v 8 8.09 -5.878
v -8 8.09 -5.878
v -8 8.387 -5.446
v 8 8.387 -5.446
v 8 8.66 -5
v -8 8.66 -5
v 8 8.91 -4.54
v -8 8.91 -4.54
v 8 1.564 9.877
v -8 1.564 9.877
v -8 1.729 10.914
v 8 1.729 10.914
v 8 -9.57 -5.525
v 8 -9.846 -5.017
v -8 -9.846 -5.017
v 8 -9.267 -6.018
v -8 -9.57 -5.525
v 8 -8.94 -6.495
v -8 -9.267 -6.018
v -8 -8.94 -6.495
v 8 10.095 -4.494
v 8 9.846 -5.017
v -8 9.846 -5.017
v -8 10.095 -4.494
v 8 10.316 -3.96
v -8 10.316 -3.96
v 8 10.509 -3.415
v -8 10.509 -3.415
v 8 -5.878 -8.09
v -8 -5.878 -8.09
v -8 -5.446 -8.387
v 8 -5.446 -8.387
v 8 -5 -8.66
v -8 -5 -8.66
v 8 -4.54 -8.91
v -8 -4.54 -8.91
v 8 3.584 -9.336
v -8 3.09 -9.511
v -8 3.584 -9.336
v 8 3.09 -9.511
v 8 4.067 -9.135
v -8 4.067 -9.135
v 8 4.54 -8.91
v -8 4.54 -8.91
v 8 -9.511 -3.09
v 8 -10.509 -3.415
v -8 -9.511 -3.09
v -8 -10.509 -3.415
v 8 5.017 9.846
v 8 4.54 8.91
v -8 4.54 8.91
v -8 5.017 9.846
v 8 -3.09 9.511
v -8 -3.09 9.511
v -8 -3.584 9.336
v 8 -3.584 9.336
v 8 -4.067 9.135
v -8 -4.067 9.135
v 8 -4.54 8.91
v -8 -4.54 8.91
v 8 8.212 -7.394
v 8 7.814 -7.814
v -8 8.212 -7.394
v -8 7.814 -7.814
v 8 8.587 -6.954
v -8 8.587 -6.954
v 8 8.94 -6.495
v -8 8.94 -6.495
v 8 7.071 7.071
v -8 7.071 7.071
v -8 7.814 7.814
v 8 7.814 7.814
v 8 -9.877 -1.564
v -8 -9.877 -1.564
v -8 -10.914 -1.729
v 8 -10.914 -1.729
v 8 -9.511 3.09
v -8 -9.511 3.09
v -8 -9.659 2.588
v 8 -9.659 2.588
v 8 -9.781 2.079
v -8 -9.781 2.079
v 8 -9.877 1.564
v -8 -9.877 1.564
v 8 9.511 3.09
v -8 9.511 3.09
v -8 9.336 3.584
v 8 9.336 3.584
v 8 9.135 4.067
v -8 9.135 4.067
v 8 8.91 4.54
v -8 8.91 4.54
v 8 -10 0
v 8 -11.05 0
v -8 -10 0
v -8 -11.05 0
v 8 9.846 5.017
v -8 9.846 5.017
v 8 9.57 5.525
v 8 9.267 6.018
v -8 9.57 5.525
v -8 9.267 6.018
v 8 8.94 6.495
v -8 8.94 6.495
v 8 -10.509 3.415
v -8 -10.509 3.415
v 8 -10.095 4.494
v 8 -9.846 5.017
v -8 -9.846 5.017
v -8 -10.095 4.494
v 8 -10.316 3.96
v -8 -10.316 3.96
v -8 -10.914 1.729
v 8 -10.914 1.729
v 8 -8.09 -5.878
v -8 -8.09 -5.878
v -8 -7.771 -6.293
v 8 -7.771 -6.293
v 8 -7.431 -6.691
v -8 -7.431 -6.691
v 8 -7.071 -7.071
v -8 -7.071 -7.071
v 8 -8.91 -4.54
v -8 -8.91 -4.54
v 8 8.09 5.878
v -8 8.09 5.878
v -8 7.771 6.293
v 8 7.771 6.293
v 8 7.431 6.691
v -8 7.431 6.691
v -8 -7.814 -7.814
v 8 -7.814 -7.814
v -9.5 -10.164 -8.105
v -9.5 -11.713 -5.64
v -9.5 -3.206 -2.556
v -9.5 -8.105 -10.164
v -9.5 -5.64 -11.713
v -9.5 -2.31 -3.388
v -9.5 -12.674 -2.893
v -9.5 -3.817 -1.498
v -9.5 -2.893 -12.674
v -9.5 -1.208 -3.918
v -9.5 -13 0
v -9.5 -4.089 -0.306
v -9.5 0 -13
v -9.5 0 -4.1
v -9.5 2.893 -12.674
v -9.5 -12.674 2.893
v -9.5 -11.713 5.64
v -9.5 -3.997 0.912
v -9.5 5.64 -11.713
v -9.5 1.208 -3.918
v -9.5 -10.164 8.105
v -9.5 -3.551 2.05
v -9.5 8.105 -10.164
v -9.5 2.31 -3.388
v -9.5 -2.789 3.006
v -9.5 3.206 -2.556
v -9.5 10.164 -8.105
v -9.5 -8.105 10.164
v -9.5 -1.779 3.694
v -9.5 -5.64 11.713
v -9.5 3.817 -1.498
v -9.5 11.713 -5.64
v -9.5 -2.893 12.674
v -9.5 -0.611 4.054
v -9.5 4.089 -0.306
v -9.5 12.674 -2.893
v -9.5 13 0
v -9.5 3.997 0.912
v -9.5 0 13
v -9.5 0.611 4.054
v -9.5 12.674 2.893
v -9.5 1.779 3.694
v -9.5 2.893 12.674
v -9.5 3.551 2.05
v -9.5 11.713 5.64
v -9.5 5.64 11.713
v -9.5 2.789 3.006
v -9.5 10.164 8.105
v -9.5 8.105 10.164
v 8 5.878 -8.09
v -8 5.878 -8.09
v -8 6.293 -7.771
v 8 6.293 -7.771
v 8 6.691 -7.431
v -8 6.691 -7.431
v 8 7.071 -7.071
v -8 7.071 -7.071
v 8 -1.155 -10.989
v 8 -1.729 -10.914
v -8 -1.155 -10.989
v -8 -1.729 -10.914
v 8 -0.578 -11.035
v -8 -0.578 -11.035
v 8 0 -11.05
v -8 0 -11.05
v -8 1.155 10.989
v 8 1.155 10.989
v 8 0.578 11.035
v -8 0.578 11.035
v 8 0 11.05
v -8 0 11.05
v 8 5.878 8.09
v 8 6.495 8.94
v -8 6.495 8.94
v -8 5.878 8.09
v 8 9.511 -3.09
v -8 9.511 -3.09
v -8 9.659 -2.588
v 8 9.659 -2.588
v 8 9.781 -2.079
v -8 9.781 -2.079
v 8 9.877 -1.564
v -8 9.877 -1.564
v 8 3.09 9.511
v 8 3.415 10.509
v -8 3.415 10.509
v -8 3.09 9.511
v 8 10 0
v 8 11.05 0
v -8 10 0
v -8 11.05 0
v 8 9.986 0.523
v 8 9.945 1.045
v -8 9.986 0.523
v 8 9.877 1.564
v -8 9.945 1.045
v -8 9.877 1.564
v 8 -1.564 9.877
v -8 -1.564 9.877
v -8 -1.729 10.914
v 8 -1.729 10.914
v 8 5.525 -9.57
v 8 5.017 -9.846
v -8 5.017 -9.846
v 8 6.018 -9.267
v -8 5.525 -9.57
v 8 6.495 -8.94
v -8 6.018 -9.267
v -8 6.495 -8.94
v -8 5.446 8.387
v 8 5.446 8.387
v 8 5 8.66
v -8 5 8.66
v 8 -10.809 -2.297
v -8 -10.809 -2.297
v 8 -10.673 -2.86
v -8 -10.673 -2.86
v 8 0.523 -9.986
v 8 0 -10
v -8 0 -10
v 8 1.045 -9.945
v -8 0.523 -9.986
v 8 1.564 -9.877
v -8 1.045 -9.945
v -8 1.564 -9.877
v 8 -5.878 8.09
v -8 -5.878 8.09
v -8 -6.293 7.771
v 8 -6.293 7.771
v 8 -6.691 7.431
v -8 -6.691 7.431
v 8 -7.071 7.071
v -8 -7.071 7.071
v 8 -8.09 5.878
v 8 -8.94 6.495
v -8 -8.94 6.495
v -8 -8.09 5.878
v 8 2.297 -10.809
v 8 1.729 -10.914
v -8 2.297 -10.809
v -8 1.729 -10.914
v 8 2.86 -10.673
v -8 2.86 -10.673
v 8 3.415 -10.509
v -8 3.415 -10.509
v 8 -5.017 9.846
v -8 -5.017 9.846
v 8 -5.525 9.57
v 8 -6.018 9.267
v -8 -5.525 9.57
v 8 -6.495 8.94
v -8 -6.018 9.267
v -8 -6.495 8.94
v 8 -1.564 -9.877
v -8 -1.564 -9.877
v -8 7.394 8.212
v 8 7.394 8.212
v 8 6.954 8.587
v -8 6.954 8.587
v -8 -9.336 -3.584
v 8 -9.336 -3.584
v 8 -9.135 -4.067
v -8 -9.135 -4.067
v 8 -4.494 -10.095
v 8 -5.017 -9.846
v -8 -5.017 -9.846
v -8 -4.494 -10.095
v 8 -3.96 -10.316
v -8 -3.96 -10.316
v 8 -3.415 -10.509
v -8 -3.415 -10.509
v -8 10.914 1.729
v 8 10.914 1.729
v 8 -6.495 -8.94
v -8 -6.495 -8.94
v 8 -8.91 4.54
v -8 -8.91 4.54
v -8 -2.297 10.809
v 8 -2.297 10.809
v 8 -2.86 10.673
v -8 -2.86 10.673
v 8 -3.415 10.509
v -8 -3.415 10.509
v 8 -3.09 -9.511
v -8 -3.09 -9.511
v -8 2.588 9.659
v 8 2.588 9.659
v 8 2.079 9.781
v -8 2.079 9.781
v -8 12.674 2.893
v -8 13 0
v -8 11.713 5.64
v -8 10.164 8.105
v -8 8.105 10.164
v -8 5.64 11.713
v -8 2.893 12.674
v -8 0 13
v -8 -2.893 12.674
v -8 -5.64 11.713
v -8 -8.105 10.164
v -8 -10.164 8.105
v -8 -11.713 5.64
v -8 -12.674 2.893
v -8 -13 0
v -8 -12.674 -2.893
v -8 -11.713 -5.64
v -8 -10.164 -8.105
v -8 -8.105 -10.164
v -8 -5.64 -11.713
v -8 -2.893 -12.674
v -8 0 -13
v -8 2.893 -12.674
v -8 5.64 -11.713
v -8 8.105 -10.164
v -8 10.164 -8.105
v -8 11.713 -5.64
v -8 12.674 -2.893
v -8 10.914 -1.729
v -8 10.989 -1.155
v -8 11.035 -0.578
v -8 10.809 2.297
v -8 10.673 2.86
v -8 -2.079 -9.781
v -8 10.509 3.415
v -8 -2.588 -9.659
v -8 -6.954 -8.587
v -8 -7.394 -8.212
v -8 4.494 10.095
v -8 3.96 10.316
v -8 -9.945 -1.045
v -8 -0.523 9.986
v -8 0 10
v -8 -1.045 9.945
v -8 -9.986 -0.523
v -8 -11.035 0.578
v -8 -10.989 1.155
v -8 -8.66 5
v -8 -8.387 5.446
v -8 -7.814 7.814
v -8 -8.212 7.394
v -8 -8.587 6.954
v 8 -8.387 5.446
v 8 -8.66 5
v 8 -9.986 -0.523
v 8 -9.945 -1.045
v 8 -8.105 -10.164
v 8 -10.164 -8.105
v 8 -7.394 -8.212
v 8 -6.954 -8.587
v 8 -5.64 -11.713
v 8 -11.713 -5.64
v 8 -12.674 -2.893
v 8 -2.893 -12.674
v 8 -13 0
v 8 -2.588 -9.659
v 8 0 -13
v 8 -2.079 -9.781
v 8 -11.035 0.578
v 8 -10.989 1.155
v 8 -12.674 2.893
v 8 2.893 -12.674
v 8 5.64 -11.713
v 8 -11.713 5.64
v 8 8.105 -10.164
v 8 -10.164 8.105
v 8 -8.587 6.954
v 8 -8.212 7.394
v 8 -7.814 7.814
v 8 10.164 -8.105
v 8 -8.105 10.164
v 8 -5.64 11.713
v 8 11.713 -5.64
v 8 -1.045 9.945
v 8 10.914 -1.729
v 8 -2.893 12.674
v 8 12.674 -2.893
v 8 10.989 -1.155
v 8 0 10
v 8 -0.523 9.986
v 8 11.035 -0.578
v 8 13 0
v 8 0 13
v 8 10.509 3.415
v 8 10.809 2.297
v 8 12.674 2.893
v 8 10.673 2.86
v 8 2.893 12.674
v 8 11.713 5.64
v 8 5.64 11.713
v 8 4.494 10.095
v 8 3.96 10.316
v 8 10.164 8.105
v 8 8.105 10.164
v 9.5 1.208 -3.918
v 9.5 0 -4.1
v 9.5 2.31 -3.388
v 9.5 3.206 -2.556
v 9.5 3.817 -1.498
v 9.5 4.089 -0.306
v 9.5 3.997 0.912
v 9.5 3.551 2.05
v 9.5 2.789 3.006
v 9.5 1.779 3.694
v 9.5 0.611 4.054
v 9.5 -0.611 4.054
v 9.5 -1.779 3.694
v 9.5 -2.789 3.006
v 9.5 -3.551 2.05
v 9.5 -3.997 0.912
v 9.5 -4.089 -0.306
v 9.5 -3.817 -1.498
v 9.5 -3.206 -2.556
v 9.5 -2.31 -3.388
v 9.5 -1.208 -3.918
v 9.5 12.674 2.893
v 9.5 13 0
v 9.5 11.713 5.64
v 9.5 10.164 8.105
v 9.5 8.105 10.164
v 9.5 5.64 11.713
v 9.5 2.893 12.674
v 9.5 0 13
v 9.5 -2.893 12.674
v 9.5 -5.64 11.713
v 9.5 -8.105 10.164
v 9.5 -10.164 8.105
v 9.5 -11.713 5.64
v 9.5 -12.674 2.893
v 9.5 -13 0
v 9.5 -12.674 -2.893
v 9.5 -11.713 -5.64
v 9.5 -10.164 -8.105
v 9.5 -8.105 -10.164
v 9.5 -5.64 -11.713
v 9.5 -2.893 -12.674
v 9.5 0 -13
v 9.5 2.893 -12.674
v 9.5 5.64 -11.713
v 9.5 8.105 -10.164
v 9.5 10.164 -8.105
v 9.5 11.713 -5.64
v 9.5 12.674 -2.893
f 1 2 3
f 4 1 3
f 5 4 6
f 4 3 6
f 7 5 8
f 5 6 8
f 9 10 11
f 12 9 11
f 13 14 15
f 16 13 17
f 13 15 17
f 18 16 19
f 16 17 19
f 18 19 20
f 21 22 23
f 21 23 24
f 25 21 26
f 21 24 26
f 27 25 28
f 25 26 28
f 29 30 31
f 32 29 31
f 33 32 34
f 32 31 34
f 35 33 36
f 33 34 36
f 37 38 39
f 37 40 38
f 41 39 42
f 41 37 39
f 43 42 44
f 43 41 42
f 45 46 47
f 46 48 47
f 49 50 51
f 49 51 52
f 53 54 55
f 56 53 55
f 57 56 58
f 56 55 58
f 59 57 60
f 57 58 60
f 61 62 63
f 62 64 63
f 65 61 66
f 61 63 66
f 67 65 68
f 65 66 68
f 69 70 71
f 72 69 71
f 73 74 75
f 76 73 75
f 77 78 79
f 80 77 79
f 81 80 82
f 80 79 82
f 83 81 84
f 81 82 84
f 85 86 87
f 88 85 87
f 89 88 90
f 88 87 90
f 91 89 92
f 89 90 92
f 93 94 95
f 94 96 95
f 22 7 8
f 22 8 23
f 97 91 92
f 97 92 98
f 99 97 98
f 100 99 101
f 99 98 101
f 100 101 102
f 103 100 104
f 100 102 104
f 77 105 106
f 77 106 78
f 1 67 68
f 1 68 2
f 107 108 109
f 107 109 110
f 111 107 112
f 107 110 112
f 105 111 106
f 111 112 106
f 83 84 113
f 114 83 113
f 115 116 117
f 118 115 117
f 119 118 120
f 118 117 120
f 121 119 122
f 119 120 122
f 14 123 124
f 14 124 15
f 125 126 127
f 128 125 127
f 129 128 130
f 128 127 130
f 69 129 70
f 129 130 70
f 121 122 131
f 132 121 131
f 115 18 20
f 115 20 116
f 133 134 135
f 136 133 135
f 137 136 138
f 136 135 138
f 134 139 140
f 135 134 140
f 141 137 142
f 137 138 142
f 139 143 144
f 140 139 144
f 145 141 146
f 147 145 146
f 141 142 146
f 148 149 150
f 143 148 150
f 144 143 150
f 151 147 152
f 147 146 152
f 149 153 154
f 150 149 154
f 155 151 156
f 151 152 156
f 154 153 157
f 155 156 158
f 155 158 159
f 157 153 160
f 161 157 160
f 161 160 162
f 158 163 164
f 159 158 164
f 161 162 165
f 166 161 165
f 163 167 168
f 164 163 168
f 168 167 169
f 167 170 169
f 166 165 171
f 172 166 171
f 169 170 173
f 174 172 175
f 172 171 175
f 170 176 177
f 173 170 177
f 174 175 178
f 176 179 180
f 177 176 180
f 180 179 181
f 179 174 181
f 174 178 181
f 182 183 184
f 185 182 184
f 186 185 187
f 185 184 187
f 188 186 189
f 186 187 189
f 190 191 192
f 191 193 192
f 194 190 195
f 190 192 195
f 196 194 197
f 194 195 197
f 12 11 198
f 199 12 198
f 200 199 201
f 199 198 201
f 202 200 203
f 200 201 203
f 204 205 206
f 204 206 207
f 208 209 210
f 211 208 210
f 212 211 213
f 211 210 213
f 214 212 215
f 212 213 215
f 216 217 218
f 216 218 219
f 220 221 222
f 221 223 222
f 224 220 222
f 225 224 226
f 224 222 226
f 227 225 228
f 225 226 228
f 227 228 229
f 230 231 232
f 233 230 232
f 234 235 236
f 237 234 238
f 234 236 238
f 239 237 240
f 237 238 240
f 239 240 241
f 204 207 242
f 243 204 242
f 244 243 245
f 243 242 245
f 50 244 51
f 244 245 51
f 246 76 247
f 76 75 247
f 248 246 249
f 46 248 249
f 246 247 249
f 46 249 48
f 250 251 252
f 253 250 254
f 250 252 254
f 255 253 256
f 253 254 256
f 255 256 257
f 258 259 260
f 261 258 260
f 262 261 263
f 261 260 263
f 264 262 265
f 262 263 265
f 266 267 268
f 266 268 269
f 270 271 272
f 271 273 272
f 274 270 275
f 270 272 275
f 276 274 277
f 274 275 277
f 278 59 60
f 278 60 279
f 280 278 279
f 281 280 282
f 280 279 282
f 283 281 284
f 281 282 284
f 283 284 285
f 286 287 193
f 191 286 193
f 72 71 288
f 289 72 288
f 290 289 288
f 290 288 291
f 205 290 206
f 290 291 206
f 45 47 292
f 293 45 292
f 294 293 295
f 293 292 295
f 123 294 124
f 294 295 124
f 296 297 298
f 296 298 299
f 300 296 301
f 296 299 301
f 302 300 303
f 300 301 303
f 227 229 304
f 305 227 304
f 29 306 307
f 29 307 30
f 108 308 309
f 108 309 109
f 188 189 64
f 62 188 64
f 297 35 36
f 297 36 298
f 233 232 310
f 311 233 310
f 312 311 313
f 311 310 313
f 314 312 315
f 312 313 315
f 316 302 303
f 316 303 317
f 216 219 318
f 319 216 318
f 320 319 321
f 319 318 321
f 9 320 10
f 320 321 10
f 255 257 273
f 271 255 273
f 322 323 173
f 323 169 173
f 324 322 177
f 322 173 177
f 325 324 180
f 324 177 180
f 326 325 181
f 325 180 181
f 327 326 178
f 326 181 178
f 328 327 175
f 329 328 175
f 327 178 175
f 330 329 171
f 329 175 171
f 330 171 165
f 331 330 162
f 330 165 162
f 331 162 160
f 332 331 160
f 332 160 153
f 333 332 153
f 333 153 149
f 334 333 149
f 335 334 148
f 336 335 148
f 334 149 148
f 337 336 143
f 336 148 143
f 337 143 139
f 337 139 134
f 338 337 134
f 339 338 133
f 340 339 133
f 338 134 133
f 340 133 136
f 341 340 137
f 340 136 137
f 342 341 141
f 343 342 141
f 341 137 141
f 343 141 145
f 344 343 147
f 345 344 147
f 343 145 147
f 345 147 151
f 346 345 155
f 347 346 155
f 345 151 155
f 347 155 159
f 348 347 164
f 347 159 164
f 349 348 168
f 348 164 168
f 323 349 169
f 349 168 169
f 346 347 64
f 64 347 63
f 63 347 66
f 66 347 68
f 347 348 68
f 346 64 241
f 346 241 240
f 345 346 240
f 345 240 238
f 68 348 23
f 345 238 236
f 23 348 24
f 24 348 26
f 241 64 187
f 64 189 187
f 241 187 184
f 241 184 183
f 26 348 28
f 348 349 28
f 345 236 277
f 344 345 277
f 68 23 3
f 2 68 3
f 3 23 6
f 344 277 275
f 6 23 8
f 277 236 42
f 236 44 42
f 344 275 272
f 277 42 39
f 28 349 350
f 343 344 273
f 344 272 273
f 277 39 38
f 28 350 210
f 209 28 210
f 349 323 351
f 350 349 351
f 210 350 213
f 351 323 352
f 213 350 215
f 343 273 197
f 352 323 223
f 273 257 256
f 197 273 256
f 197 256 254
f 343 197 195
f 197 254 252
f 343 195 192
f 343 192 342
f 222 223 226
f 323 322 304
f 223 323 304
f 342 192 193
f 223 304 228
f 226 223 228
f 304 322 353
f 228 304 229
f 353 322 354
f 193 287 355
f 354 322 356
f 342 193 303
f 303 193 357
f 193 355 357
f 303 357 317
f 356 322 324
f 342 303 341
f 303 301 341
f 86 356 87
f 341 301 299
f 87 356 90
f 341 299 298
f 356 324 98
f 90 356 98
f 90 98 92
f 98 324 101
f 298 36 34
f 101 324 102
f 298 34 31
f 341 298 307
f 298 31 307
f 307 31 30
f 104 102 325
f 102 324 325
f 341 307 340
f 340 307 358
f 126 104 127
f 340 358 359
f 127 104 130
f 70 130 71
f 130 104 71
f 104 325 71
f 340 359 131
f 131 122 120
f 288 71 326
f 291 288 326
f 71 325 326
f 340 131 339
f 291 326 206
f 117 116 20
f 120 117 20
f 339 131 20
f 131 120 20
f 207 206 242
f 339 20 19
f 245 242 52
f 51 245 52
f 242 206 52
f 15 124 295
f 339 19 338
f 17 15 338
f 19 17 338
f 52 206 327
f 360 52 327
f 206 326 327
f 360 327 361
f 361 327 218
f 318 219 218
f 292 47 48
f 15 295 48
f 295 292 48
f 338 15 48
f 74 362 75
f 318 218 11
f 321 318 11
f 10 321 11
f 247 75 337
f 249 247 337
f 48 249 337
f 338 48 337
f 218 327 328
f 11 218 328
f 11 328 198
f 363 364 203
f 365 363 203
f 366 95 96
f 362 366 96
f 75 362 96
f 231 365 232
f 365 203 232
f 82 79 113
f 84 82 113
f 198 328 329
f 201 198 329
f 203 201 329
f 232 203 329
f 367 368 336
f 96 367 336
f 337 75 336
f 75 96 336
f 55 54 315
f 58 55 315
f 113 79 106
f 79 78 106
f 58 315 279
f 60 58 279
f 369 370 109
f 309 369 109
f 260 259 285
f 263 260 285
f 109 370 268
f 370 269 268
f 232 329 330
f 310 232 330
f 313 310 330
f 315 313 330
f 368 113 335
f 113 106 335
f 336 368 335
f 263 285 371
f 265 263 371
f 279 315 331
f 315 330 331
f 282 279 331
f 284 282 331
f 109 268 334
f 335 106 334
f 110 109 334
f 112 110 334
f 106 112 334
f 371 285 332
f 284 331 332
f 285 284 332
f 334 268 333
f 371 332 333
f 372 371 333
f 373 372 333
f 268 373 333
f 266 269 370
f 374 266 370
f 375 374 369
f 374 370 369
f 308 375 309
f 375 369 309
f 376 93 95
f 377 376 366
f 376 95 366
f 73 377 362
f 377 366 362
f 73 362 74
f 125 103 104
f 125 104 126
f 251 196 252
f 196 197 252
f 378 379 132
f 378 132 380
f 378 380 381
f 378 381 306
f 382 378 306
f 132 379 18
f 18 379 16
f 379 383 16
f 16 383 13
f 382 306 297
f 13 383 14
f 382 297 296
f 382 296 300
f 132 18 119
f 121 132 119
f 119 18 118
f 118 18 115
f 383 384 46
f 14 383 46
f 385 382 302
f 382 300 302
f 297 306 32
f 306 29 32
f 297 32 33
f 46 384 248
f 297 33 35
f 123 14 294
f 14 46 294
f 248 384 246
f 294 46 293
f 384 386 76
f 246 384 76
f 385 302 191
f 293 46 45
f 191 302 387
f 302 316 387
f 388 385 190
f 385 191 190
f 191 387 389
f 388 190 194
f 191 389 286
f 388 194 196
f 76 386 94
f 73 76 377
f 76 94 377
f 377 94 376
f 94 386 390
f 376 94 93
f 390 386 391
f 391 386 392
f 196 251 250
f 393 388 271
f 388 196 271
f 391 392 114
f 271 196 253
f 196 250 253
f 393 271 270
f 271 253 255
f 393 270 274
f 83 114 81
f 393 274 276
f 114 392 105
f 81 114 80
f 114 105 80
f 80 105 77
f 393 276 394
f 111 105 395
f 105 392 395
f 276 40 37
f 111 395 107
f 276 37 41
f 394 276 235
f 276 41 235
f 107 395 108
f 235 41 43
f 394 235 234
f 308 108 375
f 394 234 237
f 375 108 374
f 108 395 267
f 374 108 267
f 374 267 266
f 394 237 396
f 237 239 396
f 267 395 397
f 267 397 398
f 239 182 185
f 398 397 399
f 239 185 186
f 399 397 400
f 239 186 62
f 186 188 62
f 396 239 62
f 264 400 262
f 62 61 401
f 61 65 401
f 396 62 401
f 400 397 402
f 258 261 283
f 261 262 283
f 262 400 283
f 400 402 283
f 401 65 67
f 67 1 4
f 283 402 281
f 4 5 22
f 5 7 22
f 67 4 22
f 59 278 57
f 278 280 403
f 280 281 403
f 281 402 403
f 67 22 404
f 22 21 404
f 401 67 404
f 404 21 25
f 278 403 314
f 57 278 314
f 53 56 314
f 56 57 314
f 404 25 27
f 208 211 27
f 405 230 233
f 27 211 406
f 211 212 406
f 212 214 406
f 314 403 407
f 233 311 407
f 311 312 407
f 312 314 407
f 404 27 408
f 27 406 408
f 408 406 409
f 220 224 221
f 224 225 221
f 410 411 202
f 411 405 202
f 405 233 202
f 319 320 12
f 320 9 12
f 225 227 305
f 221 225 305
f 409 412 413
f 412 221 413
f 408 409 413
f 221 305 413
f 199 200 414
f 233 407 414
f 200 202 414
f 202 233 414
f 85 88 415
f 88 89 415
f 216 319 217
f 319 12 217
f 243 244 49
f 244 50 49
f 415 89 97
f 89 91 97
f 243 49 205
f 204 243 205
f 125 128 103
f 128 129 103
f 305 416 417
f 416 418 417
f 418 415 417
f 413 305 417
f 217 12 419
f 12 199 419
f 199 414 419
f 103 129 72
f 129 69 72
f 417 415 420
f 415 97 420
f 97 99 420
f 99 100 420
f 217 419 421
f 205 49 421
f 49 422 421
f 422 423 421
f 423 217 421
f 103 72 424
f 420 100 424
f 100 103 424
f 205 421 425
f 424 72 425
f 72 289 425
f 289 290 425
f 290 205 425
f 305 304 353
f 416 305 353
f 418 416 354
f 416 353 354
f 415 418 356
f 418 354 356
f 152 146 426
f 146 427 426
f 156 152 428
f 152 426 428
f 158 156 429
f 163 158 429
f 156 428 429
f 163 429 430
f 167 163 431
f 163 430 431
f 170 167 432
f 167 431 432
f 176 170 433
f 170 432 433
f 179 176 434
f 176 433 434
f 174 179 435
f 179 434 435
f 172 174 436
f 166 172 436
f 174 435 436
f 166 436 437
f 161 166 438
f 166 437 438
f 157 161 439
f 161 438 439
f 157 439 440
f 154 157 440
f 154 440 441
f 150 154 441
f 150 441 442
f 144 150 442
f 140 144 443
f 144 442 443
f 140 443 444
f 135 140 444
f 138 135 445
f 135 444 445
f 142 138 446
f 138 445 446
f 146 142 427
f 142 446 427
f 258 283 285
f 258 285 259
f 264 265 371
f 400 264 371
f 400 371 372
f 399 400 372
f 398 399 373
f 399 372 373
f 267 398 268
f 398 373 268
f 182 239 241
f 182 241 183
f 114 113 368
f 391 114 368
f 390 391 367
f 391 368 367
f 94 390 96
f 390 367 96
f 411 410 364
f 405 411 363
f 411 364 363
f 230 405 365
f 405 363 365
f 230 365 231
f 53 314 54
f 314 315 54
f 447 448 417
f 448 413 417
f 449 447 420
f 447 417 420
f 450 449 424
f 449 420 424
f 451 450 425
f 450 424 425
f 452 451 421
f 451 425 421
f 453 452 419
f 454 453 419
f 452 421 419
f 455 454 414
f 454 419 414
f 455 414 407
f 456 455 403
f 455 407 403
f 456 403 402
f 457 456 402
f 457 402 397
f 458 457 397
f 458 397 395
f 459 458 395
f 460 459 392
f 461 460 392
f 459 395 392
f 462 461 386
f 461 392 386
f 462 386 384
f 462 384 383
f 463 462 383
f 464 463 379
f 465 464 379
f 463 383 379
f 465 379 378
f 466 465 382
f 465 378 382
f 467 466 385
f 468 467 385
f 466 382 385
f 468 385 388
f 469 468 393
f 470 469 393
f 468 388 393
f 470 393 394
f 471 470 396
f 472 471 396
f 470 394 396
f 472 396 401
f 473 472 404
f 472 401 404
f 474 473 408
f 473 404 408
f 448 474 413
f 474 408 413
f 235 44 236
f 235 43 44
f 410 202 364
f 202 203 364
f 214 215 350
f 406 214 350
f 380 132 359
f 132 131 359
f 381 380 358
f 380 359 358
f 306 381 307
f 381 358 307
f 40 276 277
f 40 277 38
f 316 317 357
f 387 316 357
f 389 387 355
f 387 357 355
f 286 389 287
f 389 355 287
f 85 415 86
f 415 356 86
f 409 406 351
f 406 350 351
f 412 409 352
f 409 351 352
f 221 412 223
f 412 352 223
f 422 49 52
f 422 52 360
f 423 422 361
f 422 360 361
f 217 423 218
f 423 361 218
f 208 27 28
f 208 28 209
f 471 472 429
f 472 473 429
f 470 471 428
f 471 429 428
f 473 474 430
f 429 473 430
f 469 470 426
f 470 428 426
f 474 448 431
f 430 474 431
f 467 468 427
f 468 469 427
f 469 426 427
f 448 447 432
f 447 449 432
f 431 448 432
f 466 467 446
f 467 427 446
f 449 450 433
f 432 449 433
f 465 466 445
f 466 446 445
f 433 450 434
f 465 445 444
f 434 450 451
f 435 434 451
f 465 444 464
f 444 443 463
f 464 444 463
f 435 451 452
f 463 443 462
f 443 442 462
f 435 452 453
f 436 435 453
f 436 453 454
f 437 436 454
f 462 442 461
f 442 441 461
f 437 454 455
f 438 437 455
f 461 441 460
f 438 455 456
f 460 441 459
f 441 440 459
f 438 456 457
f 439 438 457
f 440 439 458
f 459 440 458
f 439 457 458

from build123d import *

# Parameters (mm, degrees)
CUT_EXTRUDE_1_DEPTH = 8
SKETCH_7_R          = 4.1
CUT_EXTRUDE_3_DEPTH = 10


with BuildPart() as part:
    # 草图1 → 旋转1 (revolve)
    with BuildSketch(Plane.XY):
        Polygon((-9.5, 0), (9.5, 0), (9.5, 13), (8, 13), (8, 11.05), (-8, 11.05), (-8, 13), (-9.5, 13), align=None)
    revolve(axis=Axis((-9.5, 0, 0), (1, 0, 0)))

    # 草图2 → 切除-拉伸1 (cut, symmetric)
    with BuildSketch(Plane(origin=(0, 0, 0), x_dir=(0, 0, -1), z_dir=(1, 0, 0))):
        with BuildLine():
            Line((11.05, 0), (10, 0))
            ThreePointArc((10, 0), (9.969173337, 0.784590957), (9.876883406, 1.56434465))
            Line((9.876883406, 1.56434465), (10.913956164, 1.728600839))
            ThreePointArc((10.913956164, 1.728600839), (11.015936538, 0.866973008), (11.05, 0))
        make_face()
        with BuildLine():
            Line((10.509174505, -3.414637788), (9.510565163, -3.090169944))
            ThreePointArc((9.510565163, -3.090169944), (9.723699204, -2.334453639), (9.876883406, -1.56434465))
            Line((9.876883406, -1.56434465), (10.913956164, -1.728600839))
            ThreePointArc((10.913956164, -1.728600839), (10.74468762, -2.579571271), (10.509174505, -3.414637788))
        make_face()
        with BuildLine():
            Line((8.939637788, -6.495027038), (8.090169944, -5.877852523))
            ThreePointArc((8.090169944, -5.877852523), (8.526401644, -5.224985647), (8.910065242, -4.539904997))
            Line((8.910065242, -4.539904997), (9.845622092, -5.016595022))
            ThreePointArc((9.845622092, -5.016595022), (9.421673816, -5.77360914), (8.939637788, -6.495027038))
        make_face()
        with BuildLine():
            Line((6.495027038, -8.939637788), (5.877852523, -8.090169944))
            ThreePointArc((5.877852523, -8.090169944), (6.494480483, -7.604059656), (7.071067812, -7.071067812))
            Line((7.071067812, -7.071067812), (7.813529932, -7.813529932))
            ThreePointArc((7.813529932, -7.813529932), (7.176400934, -8.40248592), (6.495027038, -8.939637788))
        make_face()
        with BuildLine():
            Line((3.414637788, -10.509174505), (3.090169944, -9.510565163))
            ThreePointArc((3.090169944, -9.510565163), (3.826834324, -9.238795325), (4.539904997, -8.910065242))
            Line((4.539904997, -8.910065242), (5.016595022, -9.845622092))
            ThreePointArc((5.016595022, -9.845622092), (4.228651928, -10.208868834), (3.414637788, -10.509174505))
        make_face()
        with BuildLine():
            Line((0, -11.05), (0, -10))
            ThreePointArc((0, -10), (0.784590957, -9.969173337), (1.56434465, -9.876883406))
            Line((1.56434465, -9.876883406), (1.728600839, -10.913956164))
            ThreePointArc((1.728600839, -10.913956164), (0.866973008, -11.015936538), (0, -11.05))
        make_face()
        with BuildLine():
            Line((-3.414637788, -10.509174505), (-3.090169944, -9.510565163))
            ThreePointArc((-3.090169944, -9.510565163), (-2.334453639, -9.723699204), (-1.56434465, -9.876883406))
            Line((-1.56434465, -9.876883406), (-1.728600839, -10.913956164))
            ThreePointArc((-1.728600839, -10.913956164), (-2.579571271, -10.74468762), (-3.414637788, -10.509174505))
        make_face()
        with BuildLine():
            Line((-6.495027038, -8.939637788), (-5.877852523, -8.090169944))
            ThreePointArc((-5.877852523, -8.090169944), (-5.224985647, -8.526401644), (-4.539904997, -8.910065242))
            Line((-4.539904997, -8.910065242), (-5.016595022, -9.845622092))
            ThreePointArc((-5.016595022, -9.845622092), (-5.77360914, -9.421673816), (-6.495027038, -8.939637788))
        make_face()
        with BuildLine():
            Line((-8.939637788, -6.495027038), (-8.090169944, -5.877852523))
            ThreePointArc((-8.090169944, -5.877852523), (-7.604059656, -6.494480483), (-7.071067812, -7.071067812))
            Line((-7.071067812, -7.071067812), (-7.813529932, -7.813529932))
            ThreePointArc((-7.813529932, -7.813529932), (-8.40248592, -7.176400934), (-8.939637788, -6.495027038))
        make_face()
        with BuildLine():
            Line((-10.509174505, -3.414637788), (-9.510565163, -3.090169944))
            ThreePointArc((-9.510565163, -3.090169944), (-9.238795325, -3.826834324), (-8.910065242, -4.539904997))
            Line((-8.910065242, -4.539904997), (-9.845622092, -5.016595022))
            ThreePointArc((-9.845622092, -5.016595022), (-10.208868834, -4.228651928), (-10.509174505, -3.414637788))
        make_face()
        with BuildLine():
            Line((-11.05, 0), (-10, 0))
            ThreePointArc((-10, 0), (-9.969173337, -0.784590957), (-9.876883406, -1.56434465))
            Line((-9.876883406, -1.56434465), (-10.913956164, -1.728600839))
            ThreePointArc((-10.913956164, -1.728600839), (-11.015936538, -0.866973008), (-11.05, 0))
        make_face()
        with BuildLine():
            Line((-10.509174505, 3.414637788), (-9.510565163, 3.090169944))
            ThreePointArc((-9.510565163, 3.090169944), (-9.723699204, 2.334453639), (-9.876883406, 1.56434465))
            Line((-9.876883406, 1.56434465), (-10.913956164, 1.728600839))
            ThreePointArc((-10.913956164, 1.728600839), (-10.74468762, 2.579571271), (-10.509174505, 3.414637788))
        make_face()
        with BuildLine():
            Line((-8.939637788, 6.495027038), (-8.090169944, 5.877852523))
            ThreePointArc((-8.090169944, 5.877852523), (-8.526401644, 5.224985647), (-8.910065242, 4.539904997))
            Line((-8.910065242, 4.539904997), (-9.845622092, 5.016595022))
            ThreePointArc((-9.845622092, 5.016595022), (-9.421673816, 5.77360914), (-8.939637788, 6.495027038))
        make_face()
        with BuildLine():
            Line((-6.495027038, 8.939637788), (-5.877852523, 8.090169944))
            ThreePointArc((-5.877852523, 8.090169944), (-6.494480483, 7.604059656), (-7.071067812, 7.071067812))
            Line((-7.071067812, 7.071067812), (-7.813529932, 7.813529932))
            ThreePointArc((-7.813529932, 7.813529932), (-7.176400934, 8.40248592), (-6.495027038, 8.939637788))
        make_face()
        with BuildLine():
            Line((-3.414637788, 10.509174505), (-3.090169944, 9.510565163))
            ThreePointArc((-3.090169944, 9.510565163), (-3.826834324, 9.238795325), (-4.539904997, 8.910065242))
            Line((-4.539904997, 8.910065242), (-5.016595022, 9.845622092))
            ThreePointArc((-5.016595022, 9.845622092), (-4.228651928, 10.208868834), (-3.414637788, 10.509174505))
        make_face()
        with BuildLine():
            Line((0, 11.05), (0, 10))
            ThreePointArc((0, 10), (-0.784590957, 9.969173337), (-1.56434465, 9.876883406))
            Line((-1.56434465, 9.876883406), (-1.728600839, 10.913956164))
            ThreePointArc((-1.728600839, 10.913956164), (-0.866973008, 11.015936538), (0, 11.05))
        make_face()
        with BuildLine():
            Line((3.414637788, 10.509174505), (3.090169944, 9.510565163))
            ThreePointArc((3.090169944, 9.510565163), (2.334453639, 9.723699204), (1.56434465, 9.876883406))
            Line((1.56434465, 9.876883406), (1.728600839, 10.913956164))
            ThreePointArc((1.728600839, 10.913956164), (2.579571271, 10.74468762), (3.414637788, 10.509174505))
        make_face()
        with BuildLine():
            Line((6.495027038, 8.939637788), (5.877852523, 8.090169944))
            ThreePointArc((5.877852523, 8.090169944), (5.224985647, 8.526401644), (4.539904997, 8.910065242))
            Line((4.539904997, 8.910065242), (5.016595022, 9.845622092))
            ThreePointArc((5.016595022, 9.845622092), (5.77360914, 9.421673816), (6.495027038, 8.939637788))
        make_face()
        with BuildLine():
            Line((8.939637788, 6.495027038), (8.090169944, 5.877852523))
            ThreePointArc((8.090169944, 5.877852523), (7.604059656, 6.494480483), (7.071067812, 7.071067812))
            Line((7.071067812, 7.071067812), (7.813529932, 7.813529932))
            ThreePointArc((7.813529932, 7.813529932), (8.40248592, 7.176400934), (8.939637788, 6.495027038))
        make_face()
        with BuildLine():
            Line((10.509174505, 3.414637788), (9.510565163, 3.090169944))
            ThreePointArc((9.510565163, 3.090169944), (9.238795325, 3.826834324), (8.910065242, 4.539904997))
            Line((8.910065242, 4.539904997), (9.845622092, 5.016595022))
            ThreePointArc((9.845622092, 5.016595022), (10.208868834, 4.228651928), (10.509174505, 3.414637788))
        make_face()
    extrude(amount=CUT_EXTRUDE_1_DEPTH, both=True, mode=Mode.SUBTRACT)

    # 草图7 → 切除-拉伸3 (cut, symmetric)
    with BuildSketch(Plane(origin=(0, 0, 0), x_dir=(0, 0, -1), z_dir=(1, 0, 0))):
        Circle(SKETCH_7_R)
    extrude(amount=CUT_EXTRUDE_3_DEPTH, both=True, mode=Mode.SUBTRACT)


solid = part.part
